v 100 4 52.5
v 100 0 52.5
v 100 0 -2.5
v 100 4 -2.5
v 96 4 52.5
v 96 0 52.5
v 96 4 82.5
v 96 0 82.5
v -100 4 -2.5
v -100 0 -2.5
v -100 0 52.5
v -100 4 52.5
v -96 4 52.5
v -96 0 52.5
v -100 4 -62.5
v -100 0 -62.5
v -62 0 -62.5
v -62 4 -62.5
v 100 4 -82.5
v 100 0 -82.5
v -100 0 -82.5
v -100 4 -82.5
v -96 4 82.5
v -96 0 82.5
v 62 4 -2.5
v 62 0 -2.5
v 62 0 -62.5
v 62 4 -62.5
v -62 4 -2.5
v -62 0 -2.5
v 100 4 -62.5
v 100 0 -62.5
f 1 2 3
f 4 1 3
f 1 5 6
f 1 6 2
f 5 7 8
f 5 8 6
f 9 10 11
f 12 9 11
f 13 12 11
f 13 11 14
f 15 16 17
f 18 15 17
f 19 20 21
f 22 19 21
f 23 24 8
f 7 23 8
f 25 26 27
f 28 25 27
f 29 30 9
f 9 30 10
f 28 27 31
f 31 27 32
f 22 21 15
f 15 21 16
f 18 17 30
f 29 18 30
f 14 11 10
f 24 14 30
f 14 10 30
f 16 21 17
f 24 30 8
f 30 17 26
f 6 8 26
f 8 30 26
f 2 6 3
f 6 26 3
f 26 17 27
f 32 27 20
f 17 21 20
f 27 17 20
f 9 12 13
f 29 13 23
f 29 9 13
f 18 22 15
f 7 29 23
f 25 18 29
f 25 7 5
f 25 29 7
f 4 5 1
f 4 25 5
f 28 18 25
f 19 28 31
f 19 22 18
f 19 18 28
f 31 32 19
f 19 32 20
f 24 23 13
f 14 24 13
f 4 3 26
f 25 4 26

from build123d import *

# Parameters (mm, degrees)
SALIENTE_EXTRUIR1_DEPTH = 4
CORTAR_EXTRUIR1_REACH   = 131.701
CROQUIS4_W              = 4
CROQUIS4_H              = 30


with BuildPart() as part:
    # Croquis3 → Saliente-Extruir1 (new body)
    with BuildSketch(Plane(origin=(0, 0, 0), x_dir=(1, 0, 0), z_dir=(0, 1, 0))):
        Polygon((100, 82.5), (-100, 82.5), (-100, 62.5), (-62, 62.5), (-62, 2.5), (-100, 2.5), (-100, -82.5), (100, -82.5), (100, 2.5), (62, 2.5), (62, 62.5), (100, 62.5), align=None)
    extrude(amount=SALIENTE_EXTRUIR1_DEPTH)

    # Croquis4 → Cortar-Extruir1 (cut, up to next)
    with BuildSketch(Plane(origin=(0, 4, 0), x_dir=(1, 0, 0), z_dir=(0, 1, 0)), mode=Mode.PRIVATE) as cortar_extruir1_sk1:
        with Locations((98, -67.5)):
            Rectangle(CROQUIS4_W, CROQUIS4_H)
    cortar_extruir1_tool1 = extrude(cortar_extruir1_sk1.sketch, amount=-CORTAR_EXTRUIR1_REACH, mode=Mode.PRIVATE) & part.part
    # Croquis4 → Cortar-Extruir1 (cut, up to next)
    with BuildSketch(Plane(origin=(0, 4, 0), x_dir=(1, 0, 0), z_dir=(0, 1, 0)), mode=Mode.PRIVATE) as cortar_extruir1_sk2:
        with Locations((-98, -67.5)):
            Rectangle(CROQUIS4_W, CROQUIS4_H)
    cortar_extruir1_tool2 = extrude(cortar_extruir1_sk2.sketch, amount=-CORTAR_EXTRUIR1_REACH, mode=Mode.PRIVATE) & part.part
    add(cortar_extruir1_tool1.solids().sort_by_distance((98, 4, 67.5))[0], mode=Mode.SUBTRACT)
    add(cortar_extruir1_tool2.solids().sort_by_distance((-98, 4, 67.5))[0], mode=Mode.SUBTRACT)


solid = part.part
